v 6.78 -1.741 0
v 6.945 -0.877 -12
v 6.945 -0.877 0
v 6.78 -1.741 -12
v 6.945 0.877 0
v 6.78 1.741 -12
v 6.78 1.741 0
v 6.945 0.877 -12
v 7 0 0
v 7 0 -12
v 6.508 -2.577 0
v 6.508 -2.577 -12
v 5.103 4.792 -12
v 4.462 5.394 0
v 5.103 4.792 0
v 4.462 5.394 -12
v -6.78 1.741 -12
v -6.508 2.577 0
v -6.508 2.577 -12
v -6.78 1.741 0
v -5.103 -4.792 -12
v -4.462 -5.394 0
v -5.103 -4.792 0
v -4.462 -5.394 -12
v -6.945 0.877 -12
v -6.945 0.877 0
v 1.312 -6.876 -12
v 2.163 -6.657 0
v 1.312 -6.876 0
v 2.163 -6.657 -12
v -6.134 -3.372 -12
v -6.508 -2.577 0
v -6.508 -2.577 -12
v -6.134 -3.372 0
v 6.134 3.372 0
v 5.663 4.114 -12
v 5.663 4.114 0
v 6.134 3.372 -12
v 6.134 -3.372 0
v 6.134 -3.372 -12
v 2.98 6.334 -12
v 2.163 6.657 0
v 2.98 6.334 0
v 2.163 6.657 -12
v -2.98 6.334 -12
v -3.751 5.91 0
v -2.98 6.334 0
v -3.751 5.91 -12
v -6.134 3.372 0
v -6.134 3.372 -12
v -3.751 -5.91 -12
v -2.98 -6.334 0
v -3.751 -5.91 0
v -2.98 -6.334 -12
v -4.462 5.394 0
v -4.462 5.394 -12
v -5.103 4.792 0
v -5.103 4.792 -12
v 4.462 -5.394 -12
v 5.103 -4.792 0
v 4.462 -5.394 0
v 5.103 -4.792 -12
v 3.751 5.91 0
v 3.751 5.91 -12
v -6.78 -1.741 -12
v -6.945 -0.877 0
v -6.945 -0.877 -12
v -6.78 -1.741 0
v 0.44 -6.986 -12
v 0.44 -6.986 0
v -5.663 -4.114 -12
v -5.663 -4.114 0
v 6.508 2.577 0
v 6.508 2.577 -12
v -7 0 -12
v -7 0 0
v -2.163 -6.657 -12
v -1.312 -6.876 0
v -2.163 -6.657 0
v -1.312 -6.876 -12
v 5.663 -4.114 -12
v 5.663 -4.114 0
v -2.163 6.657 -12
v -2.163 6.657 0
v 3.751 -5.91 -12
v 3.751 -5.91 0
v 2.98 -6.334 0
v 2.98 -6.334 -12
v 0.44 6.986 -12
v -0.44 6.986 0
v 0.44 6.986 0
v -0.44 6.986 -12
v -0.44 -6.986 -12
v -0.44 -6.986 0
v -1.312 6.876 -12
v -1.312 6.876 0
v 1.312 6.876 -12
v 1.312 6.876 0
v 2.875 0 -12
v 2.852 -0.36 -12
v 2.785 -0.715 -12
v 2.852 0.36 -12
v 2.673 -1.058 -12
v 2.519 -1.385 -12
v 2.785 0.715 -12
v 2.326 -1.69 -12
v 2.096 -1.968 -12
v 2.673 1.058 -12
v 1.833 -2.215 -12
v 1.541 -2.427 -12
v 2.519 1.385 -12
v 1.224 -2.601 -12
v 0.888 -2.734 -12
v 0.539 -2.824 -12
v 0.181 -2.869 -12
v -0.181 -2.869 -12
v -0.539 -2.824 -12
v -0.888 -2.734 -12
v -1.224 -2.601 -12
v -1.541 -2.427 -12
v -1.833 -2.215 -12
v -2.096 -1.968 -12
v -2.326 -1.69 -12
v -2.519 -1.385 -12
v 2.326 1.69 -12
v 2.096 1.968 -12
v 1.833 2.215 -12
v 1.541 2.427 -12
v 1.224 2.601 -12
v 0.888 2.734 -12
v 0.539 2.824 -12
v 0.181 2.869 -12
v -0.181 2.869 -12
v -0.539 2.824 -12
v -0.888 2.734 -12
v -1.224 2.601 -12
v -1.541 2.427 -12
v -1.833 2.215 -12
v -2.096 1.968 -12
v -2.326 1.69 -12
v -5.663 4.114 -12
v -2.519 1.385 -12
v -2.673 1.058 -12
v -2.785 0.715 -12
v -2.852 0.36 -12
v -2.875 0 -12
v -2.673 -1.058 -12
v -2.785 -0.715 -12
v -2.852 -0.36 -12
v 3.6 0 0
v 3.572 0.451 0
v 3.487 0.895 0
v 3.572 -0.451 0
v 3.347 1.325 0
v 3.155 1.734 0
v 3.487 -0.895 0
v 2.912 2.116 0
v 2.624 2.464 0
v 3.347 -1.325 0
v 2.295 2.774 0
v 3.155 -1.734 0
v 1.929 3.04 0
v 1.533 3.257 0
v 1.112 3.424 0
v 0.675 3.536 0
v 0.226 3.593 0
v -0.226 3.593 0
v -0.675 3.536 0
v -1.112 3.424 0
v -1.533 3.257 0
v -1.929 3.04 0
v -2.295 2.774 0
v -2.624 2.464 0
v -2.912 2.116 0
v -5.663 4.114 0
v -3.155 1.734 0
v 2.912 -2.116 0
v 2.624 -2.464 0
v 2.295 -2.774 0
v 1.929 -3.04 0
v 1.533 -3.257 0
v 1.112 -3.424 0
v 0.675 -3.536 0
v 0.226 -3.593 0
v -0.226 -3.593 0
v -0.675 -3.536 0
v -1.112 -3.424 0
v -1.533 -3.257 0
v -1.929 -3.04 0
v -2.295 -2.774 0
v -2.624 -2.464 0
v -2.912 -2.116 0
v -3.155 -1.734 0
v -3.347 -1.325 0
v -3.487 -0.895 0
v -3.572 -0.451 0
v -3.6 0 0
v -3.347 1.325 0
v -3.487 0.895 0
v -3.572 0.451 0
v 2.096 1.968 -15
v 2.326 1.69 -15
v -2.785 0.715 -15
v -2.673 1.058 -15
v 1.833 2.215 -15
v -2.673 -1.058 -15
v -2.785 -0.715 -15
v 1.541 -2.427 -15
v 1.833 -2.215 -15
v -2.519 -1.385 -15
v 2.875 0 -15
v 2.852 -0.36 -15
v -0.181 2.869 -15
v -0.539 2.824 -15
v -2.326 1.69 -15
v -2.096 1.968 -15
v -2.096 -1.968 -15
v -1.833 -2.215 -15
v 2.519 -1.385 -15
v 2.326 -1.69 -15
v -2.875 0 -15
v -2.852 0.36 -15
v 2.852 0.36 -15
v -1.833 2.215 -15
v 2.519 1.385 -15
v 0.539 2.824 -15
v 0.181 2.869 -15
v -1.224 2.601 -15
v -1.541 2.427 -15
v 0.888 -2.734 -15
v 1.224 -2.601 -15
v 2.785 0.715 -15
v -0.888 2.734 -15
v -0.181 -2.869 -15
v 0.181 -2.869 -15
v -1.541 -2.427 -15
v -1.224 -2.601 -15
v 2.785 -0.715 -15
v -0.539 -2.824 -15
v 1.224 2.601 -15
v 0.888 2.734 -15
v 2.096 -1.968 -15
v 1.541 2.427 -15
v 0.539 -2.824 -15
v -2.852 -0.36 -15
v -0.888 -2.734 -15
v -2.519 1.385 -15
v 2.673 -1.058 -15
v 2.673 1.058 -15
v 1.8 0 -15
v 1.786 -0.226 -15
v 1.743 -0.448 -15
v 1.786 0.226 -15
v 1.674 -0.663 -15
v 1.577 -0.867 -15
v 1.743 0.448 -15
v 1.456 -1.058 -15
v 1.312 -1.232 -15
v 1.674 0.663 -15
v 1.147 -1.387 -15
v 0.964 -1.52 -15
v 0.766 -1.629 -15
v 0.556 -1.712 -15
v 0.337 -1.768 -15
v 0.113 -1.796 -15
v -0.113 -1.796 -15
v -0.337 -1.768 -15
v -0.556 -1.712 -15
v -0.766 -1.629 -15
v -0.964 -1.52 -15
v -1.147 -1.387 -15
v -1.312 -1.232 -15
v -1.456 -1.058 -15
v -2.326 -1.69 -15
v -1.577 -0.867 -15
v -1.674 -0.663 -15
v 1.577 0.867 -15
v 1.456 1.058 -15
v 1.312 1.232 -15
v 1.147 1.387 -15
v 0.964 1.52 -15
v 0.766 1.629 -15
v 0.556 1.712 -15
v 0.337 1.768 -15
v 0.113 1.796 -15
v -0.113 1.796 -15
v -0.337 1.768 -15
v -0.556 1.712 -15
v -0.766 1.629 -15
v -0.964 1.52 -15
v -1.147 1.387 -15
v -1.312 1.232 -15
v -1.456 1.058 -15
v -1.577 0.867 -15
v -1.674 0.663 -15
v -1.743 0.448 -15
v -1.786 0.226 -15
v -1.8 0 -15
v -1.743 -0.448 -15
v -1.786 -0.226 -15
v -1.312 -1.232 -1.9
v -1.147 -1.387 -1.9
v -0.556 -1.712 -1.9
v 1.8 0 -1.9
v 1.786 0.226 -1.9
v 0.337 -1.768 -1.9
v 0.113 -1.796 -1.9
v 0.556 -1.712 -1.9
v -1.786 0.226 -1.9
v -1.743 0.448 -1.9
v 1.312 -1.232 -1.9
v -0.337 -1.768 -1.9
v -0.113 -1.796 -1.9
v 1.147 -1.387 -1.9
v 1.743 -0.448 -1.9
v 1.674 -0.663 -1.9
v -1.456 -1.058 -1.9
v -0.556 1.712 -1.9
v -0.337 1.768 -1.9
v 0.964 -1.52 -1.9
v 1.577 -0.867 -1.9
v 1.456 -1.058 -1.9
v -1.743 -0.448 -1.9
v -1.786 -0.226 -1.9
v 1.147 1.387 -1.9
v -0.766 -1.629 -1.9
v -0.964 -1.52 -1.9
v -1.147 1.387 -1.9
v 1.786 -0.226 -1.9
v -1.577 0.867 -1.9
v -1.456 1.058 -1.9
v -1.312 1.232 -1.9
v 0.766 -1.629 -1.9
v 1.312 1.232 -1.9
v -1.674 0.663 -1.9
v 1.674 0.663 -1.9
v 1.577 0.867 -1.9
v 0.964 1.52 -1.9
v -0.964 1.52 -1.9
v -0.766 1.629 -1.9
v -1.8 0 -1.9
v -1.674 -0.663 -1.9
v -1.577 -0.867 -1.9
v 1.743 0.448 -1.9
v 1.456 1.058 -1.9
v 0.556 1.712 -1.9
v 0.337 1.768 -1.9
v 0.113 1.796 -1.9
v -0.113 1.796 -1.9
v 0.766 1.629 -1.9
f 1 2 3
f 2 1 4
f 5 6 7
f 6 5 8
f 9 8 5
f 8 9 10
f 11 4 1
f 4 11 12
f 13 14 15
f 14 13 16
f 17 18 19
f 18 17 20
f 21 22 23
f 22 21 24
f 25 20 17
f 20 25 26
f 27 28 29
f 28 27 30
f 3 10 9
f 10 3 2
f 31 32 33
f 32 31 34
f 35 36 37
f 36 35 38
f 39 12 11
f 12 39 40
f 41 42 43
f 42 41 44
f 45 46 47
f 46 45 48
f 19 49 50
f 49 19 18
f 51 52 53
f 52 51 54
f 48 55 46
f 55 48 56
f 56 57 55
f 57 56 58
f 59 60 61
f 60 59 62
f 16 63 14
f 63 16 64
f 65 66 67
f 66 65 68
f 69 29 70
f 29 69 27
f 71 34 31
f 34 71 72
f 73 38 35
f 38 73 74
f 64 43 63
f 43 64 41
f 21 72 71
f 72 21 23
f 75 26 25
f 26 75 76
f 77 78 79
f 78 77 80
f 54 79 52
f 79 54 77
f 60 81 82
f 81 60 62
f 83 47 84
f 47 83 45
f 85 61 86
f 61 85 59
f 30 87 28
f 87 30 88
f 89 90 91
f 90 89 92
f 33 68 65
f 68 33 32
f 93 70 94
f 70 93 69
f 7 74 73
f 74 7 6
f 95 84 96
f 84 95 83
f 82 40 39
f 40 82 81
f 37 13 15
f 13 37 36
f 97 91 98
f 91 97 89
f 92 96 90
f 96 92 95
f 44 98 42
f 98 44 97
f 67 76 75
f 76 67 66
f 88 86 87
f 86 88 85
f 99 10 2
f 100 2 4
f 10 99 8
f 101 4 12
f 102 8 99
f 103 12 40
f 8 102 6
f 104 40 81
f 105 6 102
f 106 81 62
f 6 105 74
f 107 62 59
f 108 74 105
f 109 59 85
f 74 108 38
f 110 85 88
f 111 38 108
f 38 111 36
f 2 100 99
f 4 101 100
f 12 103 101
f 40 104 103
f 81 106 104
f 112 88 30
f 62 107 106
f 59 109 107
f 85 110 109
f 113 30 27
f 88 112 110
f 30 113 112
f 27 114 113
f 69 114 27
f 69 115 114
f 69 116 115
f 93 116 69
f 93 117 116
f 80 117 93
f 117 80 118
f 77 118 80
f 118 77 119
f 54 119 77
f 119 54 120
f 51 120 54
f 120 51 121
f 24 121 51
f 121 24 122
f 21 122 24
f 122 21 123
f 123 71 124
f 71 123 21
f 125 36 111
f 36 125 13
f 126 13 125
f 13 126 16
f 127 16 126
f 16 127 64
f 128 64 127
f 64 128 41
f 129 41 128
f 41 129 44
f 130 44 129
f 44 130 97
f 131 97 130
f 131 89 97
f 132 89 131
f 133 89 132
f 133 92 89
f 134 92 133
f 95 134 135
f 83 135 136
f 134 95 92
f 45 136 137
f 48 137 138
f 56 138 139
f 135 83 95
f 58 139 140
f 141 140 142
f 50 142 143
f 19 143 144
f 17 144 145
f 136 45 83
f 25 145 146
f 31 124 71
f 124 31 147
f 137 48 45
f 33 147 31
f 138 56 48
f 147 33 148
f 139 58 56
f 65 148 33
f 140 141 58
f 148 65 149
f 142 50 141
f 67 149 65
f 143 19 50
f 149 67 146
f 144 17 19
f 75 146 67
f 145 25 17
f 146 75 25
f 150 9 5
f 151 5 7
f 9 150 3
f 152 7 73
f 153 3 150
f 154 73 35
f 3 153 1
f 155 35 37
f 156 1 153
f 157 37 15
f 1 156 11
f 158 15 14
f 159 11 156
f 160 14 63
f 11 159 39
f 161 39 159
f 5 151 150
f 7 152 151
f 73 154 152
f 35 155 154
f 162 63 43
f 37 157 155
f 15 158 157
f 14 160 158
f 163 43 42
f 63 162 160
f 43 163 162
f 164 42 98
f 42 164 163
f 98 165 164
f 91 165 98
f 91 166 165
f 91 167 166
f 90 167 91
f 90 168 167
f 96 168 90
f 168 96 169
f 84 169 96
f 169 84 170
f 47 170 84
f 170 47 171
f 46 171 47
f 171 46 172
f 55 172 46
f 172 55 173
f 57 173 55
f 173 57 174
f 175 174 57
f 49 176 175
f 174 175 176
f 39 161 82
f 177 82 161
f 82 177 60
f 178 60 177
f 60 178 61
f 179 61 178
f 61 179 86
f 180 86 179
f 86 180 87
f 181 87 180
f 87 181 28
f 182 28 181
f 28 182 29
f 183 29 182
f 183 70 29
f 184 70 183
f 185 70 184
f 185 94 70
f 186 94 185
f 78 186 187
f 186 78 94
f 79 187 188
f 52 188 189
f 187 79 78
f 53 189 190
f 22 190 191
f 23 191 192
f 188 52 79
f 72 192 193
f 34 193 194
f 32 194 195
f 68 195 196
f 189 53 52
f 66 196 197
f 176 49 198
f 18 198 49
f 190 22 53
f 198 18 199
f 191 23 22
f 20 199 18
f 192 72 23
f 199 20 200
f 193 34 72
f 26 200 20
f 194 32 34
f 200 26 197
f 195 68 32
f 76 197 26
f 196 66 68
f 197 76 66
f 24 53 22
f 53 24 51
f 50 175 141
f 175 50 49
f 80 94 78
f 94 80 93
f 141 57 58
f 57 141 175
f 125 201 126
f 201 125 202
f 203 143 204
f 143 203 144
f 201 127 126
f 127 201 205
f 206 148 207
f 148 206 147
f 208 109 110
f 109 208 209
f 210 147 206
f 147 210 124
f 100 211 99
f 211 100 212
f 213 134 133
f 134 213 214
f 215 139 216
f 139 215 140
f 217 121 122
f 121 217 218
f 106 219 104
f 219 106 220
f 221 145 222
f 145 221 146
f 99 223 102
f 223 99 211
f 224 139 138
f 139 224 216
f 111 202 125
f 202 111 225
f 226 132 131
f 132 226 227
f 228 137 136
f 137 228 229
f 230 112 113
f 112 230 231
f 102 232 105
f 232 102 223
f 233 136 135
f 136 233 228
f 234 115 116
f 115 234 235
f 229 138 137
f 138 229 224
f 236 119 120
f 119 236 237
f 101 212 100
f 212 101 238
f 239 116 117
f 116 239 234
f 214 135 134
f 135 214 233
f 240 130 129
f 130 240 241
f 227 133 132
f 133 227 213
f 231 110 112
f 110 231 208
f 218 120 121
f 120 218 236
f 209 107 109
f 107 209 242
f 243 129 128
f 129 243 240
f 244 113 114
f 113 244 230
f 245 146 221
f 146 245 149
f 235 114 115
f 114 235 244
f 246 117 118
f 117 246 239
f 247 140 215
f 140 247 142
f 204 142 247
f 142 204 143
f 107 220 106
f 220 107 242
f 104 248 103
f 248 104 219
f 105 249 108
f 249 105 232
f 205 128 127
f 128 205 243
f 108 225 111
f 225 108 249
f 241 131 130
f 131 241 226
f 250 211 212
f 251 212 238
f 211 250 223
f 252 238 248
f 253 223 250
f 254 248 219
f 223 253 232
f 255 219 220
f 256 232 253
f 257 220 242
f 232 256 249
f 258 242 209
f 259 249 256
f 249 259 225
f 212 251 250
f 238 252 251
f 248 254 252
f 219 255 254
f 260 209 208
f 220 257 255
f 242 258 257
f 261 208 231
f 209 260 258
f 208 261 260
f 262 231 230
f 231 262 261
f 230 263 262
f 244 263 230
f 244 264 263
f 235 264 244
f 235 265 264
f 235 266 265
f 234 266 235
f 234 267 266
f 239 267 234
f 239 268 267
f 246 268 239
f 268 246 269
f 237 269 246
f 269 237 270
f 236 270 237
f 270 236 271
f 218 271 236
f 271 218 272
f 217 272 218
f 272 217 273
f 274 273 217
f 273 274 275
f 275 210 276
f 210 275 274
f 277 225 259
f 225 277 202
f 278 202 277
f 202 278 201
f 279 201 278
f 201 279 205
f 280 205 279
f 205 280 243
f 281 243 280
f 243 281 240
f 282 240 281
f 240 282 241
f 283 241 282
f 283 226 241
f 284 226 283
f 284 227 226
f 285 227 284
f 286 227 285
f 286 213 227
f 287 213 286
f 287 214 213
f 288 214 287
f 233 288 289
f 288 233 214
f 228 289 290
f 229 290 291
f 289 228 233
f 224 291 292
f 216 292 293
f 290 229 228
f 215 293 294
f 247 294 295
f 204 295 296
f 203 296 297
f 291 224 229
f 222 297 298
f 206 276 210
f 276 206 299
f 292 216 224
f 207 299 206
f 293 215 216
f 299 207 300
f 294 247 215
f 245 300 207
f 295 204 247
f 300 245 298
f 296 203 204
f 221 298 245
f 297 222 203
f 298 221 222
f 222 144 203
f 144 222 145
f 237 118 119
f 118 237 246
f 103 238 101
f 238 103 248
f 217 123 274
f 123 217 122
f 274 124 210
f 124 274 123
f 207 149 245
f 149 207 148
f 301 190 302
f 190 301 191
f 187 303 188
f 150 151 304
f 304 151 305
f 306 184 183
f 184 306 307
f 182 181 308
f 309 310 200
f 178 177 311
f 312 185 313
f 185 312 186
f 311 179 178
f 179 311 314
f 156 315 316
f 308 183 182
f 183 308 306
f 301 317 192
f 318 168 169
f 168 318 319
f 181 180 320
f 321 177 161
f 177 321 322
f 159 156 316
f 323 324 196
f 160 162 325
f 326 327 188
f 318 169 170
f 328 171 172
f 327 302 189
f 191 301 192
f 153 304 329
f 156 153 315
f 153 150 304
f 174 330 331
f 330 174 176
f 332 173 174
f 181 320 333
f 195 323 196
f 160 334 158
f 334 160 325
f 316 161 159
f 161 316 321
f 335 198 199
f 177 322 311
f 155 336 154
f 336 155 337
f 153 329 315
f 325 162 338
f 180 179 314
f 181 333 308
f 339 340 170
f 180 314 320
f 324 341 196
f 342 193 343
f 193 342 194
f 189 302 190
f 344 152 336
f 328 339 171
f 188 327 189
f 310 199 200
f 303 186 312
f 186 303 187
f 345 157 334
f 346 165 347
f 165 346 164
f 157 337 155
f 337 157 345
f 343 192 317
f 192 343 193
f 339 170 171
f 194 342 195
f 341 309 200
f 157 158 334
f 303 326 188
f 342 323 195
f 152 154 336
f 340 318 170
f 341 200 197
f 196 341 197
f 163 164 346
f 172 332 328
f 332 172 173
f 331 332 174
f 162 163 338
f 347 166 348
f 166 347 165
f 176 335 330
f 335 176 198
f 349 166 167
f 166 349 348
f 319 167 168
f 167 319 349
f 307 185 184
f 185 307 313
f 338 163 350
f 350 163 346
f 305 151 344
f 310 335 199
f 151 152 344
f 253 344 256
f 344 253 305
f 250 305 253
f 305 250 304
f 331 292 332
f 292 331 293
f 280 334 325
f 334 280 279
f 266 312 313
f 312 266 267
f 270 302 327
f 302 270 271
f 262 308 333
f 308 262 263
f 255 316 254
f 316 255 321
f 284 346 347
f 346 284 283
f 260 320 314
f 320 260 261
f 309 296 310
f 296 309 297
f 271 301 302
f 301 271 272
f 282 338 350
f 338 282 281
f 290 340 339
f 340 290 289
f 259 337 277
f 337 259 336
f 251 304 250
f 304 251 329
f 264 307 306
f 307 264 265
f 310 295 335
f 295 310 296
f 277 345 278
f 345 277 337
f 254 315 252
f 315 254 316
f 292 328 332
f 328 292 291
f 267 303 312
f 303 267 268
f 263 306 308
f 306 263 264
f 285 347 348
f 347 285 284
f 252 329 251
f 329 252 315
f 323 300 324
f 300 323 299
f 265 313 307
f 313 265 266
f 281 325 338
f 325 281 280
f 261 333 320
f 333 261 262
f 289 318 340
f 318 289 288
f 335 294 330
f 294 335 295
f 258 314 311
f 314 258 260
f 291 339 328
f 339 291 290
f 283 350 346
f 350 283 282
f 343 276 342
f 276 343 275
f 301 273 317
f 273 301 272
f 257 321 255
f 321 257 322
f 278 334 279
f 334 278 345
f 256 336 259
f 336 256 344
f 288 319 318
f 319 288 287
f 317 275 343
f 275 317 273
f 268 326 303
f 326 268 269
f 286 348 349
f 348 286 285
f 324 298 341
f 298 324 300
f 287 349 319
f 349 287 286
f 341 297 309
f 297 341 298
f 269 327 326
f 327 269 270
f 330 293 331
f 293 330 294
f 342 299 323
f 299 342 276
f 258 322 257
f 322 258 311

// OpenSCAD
$fn = 50;

difference() {
	union() {
		translate(v = [0, 0, -12.0]) {
			cylinder(h = 12, r = 7.0);
		}
		#translate(v = [0, 0, -15.0]) {
			cylinder(h = 15, r = 2.875);
		}
	}
	union() {
		translate(v = [0, 0, 0]) {
			rotate(a = [0, 0, 0]) {
				difference() {
					union() {
						translate(v = [0, 0, -15.0]) {
							cylinder(h = 15, r = 1.5);
						}
						translate(v = [0, 0, -1.9]) {
							cylinder(h = 1.9, r1 = 1.8, r2 = 3.6);
						}
						translate(v = [0, 0, -15.0]) {
							cylinder(h = 15, r = 1.8);
						}
						translate(v = [0, 0, -15.0]) {
							cylinder(h = 15, r = 1.5);
						}
					}
					union();
				}
			}
		}
	}
}
